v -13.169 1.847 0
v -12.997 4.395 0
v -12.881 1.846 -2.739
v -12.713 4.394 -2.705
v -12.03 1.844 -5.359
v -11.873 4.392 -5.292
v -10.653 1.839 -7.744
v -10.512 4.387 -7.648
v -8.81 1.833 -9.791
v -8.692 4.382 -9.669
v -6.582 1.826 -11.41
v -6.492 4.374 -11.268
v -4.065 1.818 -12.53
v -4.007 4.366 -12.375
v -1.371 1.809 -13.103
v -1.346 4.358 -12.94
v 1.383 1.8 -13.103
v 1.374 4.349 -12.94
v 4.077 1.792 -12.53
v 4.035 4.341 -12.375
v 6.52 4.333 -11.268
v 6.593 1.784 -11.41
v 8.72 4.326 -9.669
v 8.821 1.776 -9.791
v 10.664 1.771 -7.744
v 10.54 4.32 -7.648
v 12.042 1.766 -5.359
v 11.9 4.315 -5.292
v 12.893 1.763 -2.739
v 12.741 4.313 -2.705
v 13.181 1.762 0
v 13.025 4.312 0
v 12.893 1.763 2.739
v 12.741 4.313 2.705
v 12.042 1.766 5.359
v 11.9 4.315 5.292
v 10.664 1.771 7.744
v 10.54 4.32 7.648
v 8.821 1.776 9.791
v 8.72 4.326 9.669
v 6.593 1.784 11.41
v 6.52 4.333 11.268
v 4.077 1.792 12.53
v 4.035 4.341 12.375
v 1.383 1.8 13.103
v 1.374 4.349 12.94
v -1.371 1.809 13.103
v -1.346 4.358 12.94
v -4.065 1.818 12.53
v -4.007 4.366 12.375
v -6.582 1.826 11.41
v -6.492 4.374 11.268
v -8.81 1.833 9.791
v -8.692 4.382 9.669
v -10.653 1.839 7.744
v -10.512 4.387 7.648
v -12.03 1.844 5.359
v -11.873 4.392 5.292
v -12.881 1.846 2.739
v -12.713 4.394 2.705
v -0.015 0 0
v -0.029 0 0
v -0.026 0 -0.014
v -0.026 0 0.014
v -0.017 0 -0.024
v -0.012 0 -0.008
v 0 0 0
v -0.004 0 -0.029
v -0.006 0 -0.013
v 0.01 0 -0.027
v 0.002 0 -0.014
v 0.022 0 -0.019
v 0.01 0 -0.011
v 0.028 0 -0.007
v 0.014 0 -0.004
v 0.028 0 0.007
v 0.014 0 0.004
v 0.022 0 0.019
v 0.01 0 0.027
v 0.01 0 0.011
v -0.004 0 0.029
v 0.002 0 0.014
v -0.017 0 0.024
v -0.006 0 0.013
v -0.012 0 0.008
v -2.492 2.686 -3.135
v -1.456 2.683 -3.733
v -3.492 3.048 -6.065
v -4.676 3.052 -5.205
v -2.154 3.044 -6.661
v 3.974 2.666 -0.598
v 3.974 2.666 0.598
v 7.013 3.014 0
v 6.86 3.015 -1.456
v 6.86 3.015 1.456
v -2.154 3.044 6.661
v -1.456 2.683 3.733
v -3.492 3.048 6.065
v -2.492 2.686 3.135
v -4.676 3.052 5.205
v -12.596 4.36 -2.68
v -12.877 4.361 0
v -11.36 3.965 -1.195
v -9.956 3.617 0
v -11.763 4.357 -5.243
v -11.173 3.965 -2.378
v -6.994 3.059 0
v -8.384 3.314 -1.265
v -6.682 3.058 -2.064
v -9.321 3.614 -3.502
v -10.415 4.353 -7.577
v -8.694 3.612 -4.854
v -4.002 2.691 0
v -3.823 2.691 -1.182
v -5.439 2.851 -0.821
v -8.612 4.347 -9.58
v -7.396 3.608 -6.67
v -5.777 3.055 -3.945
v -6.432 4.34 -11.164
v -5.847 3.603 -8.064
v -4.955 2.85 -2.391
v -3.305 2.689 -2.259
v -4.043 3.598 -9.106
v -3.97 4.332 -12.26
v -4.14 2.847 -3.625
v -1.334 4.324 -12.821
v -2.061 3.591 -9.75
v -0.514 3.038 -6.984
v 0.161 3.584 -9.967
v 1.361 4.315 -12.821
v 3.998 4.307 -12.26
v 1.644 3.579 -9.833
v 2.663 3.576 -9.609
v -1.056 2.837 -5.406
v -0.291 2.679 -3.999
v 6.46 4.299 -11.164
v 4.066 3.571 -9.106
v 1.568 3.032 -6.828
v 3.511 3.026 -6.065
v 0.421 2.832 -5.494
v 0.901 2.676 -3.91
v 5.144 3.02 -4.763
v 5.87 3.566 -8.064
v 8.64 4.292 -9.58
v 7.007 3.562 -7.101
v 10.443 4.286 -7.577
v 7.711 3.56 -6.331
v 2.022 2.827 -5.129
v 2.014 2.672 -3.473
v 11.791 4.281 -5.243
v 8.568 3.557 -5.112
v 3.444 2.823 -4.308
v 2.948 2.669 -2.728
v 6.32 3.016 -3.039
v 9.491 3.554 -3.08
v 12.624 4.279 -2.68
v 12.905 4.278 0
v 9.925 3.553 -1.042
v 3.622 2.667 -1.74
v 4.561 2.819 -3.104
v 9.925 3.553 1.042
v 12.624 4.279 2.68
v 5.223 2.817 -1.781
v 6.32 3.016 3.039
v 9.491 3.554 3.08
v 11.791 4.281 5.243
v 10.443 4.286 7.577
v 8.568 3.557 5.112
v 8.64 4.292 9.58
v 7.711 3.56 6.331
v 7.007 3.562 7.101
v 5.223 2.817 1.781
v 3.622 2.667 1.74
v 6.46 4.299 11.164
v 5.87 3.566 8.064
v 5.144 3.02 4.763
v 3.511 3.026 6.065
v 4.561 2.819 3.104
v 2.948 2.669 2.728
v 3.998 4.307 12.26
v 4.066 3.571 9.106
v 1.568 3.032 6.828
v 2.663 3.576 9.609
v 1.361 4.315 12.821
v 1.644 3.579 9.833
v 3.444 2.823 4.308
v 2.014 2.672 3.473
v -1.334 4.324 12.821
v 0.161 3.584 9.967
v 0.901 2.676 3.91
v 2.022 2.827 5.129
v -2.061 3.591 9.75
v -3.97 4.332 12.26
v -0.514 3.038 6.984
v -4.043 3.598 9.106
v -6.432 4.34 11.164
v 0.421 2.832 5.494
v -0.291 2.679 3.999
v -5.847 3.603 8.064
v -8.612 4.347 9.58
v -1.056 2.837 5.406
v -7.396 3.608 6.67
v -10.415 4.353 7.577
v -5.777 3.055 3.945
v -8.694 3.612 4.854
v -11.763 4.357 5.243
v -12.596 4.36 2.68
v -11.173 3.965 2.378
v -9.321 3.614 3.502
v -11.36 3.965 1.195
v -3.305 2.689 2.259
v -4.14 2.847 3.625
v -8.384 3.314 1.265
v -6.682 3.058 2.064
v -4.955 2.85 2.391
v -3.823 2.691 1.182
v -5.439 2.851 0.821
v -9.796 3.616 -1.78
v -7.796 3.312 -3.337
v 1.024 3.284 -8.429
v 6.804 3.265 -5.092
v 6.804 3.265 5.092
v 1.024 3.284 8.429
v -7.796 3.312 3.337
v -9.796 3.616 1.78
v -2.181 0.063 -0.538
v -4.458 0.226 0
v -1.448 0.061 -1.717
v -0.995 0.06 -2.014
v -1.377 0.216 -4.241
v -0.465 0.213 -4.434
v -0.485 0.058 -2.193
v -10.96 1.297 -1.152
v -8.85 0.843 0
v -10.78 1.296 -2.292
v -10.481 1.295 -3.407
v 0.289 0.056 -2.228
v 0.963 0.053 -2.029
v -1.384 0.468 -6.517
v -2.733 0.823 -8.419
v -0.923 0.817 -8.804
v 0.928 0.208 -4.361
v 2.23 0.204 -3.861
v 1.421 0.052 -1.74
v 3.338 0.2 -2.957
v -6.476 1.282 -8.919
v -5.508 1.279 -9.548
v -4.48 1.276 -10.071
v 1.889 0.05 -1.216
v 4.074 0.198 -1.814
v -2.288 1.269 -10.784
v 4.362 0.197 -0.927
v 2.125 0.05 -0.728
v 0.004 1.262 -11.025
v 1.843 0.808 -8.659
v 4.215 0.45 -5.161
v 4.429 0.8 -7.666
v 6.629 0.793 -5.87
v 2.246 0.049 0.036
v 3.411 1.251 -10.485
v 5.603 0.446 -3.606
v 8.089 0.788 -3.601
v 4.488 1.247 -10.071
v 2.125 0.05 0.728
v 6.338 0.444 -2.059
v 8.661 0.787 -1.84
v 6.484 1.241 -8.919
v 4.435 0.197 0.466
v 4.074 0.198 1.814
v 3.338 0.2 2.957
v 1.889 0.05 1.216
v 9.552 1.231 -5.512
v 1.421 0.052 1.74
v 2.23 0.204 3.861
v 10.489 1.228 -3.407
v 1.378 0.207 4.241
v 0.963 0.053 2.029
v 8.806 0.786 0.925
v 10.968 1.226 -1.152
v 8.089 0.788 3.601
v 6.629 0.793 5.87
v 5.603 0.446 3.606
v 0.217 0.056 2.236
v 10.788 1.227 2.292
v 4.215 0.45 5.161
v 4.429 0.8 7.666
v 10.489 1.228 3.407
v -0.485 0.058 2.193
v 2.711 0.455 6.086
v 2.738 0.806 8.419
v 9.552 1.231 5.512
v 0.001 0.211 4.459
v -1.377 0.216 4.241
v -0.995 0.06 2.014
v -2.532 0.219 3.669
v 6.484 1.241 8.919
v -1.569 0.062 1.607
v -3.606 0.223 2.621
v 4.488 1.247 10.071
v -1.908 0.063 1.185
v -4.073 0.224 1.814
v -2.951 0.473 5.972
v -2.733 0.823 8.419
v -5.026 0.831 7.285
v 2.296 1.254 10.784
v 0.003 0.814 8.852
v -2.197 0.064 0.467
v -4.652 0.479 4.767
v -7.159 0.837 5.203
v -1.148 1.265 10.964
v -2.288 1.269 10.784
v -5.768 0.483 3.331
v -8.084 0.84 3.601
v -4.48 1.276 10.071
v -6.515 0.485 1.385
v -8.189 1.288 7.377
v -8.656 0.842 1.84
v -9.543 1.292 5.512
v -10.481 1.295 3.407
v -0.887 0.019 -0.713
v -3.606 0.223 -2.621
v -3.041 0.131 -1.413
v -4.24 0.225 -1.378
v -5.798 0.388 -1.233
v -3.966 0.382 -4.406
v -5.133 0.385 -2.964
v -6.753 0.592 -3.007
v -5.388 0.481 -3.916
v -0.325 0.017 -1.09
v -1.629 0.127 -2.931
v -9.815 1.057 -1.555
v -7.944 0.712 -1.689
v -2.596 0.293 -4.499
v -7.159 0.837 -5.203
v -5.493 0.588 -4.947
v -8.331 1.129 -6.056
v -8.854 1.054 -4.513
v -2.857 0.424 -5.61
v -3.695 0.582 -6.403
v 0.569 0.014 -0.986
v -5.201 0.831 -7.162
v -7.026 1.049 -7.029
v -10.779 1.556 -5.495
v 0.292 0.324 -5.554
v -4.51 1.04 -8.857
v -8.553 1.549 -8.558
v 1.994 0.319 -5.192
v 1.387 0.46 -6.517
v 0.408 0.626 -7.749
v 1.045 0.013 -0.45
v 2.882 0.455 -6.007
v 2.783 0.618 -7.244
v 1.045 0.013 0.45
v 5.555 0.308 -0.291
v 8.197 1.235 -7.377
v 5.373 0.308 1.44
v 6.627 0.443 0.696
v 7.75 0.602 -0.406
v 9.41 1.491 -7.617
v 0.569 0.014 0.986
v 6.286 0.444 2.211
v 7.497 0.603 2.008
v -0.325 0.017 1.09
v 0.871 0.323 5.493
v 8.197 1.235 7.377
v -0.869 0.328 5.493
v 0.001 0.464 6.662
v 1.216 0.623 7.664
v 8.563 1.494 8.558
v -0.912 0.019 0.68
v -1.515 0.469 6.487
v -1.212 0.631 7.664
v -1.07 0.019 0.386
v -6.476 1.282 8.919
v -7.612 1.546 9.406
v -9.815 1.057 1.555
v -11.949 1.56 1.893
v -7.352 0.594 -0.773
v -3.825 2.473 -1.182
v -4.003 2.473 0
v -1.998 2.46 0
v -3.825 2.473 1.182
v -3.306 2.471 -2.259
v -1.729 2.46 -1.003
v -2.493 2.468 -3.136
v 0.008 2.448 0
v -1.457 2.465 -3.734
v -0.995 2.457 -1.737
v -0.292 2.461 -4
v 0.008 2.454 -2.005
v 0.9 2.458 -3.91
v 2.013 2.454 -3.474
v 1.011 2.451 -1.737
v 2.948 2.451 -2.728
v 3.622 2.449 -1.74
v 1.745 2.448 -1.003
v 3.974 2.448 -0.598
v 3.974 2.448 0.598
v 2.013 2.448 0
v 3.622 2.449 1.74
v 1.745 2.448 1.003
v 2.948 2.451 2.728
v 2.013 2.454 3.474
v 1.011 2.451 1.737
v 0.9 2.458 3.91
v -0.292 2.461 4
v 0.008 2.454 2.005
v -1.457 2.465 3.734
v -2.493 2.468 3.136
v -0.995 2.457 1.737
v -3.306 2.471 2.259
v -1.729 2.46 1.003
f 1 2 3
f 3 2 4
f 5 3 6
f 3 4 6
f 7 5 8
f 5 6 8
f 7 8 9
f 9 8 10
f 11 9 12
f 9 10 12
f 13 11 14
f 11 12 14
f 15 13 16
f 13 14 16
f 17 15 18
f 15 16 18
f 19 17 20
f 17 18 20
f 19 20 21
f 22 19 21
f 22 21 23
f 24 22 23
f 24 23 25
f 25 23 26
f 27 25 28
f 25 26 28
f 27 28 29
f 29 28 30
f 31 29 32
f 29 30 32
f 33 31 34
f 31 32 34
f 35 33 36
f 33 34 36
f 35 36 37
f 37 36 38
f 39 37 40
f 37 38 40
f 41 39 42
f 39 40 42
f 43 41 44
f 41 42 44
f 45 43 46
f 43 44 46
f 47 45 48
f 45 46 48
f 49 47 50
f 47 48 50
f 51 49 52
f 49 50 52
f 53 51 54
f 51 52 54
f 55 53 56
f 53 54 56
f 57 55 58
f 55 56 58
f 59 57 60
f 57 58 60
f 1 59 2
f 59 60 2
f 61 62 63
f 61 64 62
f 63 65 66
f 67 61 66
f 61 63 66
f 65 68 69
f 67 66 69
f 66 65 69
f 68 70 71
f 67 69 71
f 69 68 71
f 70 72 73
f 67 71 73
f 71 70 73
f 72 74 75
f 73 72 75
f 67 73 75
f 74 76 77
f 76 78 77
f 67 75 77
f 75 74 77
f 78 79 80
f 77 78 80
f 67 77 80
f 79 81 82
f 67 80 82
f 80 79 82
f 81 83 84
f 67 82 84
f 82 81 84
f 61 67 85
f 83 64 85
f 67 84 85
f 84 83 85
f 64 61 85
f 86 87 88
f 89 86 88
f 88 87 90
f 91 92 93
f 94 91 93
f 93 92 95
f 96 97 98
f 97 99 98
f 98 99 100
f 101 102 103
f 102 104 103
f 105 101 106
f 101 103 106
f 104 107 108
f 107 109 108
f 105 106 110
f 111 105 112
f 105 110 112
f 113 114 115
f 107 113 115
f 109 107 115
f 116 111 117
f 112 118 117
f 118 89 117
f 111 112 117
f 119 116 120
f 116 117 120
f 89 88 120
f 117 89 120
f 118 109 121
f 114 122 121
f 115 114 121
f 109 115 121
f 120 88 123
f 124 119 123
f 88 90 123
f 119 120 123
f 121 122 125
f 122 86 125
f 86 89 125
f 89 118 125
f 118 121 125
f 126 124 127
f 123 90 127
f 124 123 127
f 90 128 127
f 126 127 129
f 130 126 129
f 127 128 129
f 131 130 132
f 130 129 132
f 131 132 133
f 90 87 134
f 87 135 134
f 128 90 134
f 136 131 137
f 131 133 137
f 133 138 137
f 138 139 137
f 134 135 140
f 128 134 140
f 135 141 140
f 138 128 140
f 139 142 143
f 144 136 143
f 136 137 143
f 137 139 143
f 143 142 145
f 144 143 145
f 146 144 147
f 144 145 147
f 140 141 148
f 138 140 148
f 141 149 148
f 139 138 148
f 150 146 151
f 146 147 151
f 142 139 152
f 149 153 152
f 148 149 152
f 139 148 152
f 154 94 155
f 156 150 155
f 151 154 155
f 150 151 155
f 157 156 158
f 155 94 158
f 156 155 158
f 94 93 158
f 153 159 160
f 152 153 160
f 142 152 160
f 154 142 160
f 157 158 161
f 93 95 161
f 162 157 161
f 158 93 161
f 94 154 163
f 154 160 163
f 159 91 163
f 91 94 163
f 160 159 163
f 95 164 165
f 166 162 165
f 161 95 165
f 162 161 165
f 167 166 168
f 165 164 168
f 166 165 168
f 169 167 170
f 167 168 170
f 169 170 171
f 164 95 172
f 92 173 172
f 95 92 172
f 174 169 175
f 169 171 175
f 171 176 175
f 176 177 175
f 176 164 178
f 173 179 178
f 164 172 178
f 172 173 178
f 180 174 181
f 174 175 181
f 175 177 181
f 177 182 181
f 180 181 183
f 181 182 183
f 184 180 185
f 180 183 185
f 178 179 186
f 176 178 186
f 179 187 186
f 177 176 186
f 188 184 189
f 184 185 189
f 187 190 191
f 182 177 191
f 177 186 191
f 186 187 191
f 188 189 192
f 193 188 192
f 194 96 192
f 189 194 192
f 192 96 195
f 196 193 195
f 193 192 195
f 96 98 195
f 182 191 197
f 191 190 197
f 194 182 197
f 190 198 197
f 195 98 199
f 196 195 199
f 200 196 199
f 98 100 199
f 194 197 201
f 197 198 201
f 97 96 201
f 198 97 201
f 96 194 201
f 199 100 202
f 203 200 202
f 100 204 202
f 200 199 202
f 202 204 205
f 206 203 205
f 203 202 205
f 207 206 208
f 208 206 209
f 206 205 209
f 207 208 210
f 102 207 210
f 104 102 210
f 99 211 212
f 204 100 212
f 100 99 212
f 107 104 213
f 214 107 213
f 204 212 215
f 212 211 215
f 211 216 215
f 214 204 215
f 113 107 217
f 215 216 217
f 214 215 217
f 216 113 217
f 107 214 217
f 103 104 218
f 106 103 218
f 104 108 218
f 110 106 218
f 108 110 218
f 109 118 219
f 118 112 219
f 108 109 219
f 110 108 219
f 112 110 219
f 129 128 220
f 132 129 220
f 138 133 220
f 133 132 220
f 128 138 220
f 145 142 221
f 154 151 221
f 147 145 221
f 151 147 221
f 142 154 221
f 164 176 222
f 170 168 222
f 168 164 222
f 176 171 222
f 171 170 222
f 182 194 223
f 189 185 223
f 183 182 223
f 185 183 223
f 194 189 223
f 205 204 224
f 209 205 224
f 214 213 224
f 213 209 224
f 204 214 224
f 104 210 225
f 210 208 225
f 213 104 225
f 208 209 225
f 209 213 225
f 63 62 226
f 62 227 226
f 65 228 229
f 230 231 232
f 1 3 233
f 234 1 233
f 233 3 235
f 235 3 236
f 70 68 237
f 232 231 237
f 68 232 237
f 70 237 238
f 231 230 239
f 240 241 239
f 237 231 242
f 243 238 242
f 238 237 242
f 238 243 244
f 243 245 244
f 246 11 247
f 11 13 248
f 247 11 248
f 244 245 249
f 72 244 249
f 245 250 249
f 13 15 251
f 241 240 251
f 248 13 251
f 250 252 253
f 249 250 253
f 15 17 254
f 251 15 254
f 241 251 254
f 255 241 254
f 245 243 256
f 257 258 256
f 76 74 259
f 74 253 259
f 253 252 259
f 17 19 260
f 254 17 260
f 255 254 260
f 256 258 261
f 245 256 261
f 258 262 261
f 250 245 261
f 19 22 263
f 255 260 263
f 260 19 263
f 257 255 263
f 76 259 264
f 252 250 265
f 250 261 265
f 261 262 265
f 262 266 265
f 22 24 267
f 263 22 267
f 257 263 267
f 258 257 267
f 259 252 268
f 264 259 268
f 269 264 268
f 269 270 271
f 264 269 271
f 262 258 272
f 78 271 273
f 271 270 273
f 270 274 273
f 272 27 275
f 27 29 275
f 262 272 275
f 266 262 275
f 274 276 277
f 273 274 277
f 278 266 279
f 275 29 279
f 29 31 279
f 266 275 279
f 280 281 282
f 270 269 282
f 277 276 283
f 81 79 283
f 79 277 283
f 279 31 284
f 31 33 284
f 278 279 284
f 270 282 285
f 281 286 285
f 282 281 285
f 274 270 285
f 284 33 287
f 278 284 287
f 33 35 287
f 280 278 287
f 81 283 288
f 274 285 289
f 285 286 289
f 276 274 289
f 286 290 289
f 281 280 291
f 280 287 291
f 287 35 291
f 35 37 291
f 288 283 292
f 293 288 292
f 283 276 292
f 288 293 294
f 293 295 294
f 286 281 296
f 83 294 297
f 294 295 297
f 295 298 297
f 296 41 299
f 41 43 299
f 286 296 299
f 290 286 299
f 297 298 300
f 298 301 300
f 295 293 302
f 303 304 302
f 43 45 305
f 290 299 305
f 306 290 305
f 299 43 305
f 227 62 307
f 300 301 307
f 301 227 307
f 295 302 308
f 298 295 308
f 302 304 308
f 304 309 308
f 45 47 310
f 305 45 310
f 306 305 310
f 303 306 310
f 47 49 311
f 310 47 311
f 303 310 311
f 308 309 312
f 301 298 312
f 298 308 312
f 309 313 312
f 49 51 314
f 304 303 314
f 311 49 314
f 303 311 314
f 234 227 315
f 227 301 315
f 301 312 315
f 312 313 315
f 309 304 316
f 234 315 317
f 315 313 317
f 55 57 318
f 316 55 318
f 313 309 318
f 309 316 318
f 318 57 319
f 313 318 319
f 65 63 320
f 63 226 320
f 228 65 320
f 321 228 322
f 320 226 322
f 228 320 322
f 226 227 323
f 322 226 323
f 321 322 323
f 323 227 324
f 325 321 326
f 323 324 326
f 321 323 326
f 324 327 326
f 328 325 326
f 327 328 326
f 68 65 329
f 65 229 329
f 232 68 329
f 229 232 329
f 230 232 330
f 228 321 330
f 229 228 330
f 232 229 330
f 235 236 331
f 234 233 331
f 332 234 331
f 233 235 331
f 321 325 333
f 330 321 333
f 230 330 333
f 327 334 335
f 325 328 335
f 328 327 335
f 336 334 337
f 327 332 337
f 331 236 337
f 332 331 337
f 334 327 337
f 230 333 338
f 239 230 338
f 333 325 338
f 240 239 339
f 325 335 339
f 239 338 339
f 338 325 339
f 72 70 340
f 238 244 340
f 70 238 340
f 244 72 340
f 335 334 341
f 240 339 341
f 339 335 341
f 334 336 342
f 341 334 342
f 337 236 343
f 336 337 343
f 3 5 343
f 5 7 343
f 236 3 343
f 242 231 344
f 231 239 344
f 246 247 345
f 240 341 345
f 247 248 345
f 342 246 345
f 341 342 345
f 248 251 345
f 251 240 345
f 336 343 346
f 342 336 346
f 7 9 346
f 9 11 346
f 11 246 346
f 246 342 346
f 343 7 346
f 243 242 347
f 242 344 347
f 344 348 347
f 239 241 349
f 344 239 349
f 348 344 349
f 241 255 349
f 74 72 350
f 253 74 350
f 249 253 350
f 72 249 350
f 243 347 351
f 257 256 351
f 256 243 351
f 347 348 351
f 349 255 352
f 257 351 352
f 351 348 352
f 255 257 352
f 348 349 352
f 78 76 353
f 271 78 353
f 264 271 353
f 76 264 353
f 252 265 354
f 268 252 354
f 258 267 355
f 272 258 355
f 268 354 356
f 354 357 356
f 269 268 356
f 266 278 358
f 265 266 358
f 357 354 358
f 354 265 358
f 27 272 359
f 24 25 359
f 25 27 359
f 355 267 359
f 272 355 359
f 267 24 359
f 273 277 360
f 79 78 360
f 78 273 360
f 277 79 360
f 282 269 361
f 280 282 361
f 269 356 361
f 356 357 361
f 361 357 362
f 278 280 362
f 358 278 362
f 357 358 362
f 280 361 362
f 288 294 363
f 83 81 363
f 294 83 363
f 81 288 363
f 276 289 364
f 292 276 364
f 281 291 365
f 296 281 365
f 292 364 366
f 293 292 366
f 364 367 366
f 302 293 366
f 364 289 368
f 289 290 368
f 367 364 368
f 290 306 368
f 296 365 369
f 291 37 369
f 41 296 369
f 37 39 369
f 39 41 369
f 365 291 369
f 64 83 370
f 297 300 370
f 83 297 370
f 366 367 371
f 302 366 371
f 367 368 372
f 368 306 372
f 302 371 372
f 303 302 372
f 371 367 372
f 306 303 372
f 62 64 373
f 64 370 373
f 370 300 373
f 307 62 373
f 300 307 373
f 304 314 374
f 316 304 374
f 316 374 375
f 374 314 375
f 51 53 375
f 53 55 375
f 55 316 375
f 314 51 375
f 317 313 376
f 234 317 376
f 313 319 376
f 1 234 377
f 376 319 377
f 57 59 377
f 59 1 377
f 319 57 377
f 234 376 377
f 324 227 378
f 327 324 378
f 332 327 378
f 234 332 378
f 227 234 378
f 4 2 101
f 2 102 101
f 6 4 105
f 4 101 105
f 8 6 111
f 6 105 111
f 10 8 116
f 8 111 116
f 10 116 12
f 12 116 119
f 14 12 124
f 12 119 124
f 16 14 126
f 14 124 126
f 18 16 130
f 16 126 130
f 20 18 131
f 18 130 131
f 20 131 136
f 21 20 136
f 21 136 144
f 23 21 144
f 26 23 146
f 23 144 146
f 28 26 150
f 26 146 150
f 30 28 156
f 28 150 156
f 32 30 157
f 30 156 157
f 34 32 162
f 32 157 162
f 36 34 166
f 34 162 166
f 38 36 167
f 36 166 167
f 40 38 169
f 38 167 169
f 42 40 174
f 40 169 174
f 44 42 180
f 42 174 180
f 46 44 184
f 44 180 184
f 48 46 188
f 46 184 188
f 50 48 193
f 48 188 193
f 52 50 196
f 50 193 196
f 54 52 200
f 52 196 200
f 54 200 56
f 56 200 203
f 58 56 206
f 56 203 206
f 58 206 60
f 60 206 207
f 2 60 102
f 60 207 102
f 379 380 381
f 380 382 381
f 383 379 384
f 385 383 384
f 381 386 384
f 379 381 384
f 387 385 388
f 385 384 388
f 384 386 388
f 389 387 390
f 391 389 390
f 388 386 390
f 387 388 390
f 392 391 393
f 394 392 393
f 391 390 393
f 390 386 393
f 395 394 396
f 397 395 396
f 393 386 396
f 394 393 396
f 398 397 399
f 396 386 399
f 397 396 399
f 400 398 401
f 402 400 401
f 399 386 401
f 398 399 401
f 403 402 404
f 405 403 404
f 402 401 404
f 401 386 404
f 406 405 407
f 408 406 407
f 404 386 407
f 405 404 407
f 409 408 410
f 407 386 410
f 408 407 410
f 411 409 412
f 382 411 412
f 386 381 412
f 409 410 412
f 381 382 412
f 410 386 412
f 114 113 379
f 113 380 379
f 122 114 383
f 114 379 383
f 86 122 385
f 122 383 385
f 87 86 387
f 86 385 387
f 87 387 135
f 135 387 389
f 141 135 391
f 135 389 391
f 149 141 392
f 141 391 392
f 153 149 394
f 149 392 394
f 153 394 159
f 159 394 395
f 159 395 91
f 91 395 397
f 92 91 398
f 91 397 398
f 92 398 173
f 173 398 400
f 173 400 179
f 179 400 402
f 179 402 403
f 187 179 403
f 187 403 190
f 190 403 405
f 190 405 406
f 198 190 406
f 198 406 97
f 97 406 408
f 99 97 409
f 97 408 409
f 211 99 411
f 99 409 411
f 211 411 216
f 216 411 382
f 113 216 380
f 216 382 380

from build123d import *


with BuildPart() as part:
    # Çizim2 → Döndür4 (revolve)
    with BuildSketch(Plane.XY, mode=Mode.PRIVATE) as d_nd_r4_sk:
        with BuildLine():
            Line((0.007868423, 2.447551496), (0, 0))
            Line((0, 0), (0.029070392, 0))
            ThreePointArc((0.029070392, 0), (6.663636067, 0.442575925), (13.180632211, 1.762460918))
            Line((13.180632211, 1.762460918), (13.025393844, 4.311738481))
            Line((13.025393844, 4.311738481), (12.905238293, 4.277863766))
            ThreePointArc((12.905238293, 4.277863766), (8.500440894, 3.259791078), (4.018750105, 2.665518584))
            Line((4.018750105, 2.665518584), (4.018750105, 2.447549997))
            Line((4.018750105, 2.447549997), (0.007868423, 2.447551496))
        make_face()
    revolve(d_nd_r4_sk.sketch.rotate(Axis((0.007868423, 2.447551496, 0), (-0.0032147973142897033, -0.9999948325257627, 0)), 180), axis=Axis((0.007868423, 2.447551496, 0), (-0.0032147973142897033, -0.9999948325257627, 0)))


solid = part.part
